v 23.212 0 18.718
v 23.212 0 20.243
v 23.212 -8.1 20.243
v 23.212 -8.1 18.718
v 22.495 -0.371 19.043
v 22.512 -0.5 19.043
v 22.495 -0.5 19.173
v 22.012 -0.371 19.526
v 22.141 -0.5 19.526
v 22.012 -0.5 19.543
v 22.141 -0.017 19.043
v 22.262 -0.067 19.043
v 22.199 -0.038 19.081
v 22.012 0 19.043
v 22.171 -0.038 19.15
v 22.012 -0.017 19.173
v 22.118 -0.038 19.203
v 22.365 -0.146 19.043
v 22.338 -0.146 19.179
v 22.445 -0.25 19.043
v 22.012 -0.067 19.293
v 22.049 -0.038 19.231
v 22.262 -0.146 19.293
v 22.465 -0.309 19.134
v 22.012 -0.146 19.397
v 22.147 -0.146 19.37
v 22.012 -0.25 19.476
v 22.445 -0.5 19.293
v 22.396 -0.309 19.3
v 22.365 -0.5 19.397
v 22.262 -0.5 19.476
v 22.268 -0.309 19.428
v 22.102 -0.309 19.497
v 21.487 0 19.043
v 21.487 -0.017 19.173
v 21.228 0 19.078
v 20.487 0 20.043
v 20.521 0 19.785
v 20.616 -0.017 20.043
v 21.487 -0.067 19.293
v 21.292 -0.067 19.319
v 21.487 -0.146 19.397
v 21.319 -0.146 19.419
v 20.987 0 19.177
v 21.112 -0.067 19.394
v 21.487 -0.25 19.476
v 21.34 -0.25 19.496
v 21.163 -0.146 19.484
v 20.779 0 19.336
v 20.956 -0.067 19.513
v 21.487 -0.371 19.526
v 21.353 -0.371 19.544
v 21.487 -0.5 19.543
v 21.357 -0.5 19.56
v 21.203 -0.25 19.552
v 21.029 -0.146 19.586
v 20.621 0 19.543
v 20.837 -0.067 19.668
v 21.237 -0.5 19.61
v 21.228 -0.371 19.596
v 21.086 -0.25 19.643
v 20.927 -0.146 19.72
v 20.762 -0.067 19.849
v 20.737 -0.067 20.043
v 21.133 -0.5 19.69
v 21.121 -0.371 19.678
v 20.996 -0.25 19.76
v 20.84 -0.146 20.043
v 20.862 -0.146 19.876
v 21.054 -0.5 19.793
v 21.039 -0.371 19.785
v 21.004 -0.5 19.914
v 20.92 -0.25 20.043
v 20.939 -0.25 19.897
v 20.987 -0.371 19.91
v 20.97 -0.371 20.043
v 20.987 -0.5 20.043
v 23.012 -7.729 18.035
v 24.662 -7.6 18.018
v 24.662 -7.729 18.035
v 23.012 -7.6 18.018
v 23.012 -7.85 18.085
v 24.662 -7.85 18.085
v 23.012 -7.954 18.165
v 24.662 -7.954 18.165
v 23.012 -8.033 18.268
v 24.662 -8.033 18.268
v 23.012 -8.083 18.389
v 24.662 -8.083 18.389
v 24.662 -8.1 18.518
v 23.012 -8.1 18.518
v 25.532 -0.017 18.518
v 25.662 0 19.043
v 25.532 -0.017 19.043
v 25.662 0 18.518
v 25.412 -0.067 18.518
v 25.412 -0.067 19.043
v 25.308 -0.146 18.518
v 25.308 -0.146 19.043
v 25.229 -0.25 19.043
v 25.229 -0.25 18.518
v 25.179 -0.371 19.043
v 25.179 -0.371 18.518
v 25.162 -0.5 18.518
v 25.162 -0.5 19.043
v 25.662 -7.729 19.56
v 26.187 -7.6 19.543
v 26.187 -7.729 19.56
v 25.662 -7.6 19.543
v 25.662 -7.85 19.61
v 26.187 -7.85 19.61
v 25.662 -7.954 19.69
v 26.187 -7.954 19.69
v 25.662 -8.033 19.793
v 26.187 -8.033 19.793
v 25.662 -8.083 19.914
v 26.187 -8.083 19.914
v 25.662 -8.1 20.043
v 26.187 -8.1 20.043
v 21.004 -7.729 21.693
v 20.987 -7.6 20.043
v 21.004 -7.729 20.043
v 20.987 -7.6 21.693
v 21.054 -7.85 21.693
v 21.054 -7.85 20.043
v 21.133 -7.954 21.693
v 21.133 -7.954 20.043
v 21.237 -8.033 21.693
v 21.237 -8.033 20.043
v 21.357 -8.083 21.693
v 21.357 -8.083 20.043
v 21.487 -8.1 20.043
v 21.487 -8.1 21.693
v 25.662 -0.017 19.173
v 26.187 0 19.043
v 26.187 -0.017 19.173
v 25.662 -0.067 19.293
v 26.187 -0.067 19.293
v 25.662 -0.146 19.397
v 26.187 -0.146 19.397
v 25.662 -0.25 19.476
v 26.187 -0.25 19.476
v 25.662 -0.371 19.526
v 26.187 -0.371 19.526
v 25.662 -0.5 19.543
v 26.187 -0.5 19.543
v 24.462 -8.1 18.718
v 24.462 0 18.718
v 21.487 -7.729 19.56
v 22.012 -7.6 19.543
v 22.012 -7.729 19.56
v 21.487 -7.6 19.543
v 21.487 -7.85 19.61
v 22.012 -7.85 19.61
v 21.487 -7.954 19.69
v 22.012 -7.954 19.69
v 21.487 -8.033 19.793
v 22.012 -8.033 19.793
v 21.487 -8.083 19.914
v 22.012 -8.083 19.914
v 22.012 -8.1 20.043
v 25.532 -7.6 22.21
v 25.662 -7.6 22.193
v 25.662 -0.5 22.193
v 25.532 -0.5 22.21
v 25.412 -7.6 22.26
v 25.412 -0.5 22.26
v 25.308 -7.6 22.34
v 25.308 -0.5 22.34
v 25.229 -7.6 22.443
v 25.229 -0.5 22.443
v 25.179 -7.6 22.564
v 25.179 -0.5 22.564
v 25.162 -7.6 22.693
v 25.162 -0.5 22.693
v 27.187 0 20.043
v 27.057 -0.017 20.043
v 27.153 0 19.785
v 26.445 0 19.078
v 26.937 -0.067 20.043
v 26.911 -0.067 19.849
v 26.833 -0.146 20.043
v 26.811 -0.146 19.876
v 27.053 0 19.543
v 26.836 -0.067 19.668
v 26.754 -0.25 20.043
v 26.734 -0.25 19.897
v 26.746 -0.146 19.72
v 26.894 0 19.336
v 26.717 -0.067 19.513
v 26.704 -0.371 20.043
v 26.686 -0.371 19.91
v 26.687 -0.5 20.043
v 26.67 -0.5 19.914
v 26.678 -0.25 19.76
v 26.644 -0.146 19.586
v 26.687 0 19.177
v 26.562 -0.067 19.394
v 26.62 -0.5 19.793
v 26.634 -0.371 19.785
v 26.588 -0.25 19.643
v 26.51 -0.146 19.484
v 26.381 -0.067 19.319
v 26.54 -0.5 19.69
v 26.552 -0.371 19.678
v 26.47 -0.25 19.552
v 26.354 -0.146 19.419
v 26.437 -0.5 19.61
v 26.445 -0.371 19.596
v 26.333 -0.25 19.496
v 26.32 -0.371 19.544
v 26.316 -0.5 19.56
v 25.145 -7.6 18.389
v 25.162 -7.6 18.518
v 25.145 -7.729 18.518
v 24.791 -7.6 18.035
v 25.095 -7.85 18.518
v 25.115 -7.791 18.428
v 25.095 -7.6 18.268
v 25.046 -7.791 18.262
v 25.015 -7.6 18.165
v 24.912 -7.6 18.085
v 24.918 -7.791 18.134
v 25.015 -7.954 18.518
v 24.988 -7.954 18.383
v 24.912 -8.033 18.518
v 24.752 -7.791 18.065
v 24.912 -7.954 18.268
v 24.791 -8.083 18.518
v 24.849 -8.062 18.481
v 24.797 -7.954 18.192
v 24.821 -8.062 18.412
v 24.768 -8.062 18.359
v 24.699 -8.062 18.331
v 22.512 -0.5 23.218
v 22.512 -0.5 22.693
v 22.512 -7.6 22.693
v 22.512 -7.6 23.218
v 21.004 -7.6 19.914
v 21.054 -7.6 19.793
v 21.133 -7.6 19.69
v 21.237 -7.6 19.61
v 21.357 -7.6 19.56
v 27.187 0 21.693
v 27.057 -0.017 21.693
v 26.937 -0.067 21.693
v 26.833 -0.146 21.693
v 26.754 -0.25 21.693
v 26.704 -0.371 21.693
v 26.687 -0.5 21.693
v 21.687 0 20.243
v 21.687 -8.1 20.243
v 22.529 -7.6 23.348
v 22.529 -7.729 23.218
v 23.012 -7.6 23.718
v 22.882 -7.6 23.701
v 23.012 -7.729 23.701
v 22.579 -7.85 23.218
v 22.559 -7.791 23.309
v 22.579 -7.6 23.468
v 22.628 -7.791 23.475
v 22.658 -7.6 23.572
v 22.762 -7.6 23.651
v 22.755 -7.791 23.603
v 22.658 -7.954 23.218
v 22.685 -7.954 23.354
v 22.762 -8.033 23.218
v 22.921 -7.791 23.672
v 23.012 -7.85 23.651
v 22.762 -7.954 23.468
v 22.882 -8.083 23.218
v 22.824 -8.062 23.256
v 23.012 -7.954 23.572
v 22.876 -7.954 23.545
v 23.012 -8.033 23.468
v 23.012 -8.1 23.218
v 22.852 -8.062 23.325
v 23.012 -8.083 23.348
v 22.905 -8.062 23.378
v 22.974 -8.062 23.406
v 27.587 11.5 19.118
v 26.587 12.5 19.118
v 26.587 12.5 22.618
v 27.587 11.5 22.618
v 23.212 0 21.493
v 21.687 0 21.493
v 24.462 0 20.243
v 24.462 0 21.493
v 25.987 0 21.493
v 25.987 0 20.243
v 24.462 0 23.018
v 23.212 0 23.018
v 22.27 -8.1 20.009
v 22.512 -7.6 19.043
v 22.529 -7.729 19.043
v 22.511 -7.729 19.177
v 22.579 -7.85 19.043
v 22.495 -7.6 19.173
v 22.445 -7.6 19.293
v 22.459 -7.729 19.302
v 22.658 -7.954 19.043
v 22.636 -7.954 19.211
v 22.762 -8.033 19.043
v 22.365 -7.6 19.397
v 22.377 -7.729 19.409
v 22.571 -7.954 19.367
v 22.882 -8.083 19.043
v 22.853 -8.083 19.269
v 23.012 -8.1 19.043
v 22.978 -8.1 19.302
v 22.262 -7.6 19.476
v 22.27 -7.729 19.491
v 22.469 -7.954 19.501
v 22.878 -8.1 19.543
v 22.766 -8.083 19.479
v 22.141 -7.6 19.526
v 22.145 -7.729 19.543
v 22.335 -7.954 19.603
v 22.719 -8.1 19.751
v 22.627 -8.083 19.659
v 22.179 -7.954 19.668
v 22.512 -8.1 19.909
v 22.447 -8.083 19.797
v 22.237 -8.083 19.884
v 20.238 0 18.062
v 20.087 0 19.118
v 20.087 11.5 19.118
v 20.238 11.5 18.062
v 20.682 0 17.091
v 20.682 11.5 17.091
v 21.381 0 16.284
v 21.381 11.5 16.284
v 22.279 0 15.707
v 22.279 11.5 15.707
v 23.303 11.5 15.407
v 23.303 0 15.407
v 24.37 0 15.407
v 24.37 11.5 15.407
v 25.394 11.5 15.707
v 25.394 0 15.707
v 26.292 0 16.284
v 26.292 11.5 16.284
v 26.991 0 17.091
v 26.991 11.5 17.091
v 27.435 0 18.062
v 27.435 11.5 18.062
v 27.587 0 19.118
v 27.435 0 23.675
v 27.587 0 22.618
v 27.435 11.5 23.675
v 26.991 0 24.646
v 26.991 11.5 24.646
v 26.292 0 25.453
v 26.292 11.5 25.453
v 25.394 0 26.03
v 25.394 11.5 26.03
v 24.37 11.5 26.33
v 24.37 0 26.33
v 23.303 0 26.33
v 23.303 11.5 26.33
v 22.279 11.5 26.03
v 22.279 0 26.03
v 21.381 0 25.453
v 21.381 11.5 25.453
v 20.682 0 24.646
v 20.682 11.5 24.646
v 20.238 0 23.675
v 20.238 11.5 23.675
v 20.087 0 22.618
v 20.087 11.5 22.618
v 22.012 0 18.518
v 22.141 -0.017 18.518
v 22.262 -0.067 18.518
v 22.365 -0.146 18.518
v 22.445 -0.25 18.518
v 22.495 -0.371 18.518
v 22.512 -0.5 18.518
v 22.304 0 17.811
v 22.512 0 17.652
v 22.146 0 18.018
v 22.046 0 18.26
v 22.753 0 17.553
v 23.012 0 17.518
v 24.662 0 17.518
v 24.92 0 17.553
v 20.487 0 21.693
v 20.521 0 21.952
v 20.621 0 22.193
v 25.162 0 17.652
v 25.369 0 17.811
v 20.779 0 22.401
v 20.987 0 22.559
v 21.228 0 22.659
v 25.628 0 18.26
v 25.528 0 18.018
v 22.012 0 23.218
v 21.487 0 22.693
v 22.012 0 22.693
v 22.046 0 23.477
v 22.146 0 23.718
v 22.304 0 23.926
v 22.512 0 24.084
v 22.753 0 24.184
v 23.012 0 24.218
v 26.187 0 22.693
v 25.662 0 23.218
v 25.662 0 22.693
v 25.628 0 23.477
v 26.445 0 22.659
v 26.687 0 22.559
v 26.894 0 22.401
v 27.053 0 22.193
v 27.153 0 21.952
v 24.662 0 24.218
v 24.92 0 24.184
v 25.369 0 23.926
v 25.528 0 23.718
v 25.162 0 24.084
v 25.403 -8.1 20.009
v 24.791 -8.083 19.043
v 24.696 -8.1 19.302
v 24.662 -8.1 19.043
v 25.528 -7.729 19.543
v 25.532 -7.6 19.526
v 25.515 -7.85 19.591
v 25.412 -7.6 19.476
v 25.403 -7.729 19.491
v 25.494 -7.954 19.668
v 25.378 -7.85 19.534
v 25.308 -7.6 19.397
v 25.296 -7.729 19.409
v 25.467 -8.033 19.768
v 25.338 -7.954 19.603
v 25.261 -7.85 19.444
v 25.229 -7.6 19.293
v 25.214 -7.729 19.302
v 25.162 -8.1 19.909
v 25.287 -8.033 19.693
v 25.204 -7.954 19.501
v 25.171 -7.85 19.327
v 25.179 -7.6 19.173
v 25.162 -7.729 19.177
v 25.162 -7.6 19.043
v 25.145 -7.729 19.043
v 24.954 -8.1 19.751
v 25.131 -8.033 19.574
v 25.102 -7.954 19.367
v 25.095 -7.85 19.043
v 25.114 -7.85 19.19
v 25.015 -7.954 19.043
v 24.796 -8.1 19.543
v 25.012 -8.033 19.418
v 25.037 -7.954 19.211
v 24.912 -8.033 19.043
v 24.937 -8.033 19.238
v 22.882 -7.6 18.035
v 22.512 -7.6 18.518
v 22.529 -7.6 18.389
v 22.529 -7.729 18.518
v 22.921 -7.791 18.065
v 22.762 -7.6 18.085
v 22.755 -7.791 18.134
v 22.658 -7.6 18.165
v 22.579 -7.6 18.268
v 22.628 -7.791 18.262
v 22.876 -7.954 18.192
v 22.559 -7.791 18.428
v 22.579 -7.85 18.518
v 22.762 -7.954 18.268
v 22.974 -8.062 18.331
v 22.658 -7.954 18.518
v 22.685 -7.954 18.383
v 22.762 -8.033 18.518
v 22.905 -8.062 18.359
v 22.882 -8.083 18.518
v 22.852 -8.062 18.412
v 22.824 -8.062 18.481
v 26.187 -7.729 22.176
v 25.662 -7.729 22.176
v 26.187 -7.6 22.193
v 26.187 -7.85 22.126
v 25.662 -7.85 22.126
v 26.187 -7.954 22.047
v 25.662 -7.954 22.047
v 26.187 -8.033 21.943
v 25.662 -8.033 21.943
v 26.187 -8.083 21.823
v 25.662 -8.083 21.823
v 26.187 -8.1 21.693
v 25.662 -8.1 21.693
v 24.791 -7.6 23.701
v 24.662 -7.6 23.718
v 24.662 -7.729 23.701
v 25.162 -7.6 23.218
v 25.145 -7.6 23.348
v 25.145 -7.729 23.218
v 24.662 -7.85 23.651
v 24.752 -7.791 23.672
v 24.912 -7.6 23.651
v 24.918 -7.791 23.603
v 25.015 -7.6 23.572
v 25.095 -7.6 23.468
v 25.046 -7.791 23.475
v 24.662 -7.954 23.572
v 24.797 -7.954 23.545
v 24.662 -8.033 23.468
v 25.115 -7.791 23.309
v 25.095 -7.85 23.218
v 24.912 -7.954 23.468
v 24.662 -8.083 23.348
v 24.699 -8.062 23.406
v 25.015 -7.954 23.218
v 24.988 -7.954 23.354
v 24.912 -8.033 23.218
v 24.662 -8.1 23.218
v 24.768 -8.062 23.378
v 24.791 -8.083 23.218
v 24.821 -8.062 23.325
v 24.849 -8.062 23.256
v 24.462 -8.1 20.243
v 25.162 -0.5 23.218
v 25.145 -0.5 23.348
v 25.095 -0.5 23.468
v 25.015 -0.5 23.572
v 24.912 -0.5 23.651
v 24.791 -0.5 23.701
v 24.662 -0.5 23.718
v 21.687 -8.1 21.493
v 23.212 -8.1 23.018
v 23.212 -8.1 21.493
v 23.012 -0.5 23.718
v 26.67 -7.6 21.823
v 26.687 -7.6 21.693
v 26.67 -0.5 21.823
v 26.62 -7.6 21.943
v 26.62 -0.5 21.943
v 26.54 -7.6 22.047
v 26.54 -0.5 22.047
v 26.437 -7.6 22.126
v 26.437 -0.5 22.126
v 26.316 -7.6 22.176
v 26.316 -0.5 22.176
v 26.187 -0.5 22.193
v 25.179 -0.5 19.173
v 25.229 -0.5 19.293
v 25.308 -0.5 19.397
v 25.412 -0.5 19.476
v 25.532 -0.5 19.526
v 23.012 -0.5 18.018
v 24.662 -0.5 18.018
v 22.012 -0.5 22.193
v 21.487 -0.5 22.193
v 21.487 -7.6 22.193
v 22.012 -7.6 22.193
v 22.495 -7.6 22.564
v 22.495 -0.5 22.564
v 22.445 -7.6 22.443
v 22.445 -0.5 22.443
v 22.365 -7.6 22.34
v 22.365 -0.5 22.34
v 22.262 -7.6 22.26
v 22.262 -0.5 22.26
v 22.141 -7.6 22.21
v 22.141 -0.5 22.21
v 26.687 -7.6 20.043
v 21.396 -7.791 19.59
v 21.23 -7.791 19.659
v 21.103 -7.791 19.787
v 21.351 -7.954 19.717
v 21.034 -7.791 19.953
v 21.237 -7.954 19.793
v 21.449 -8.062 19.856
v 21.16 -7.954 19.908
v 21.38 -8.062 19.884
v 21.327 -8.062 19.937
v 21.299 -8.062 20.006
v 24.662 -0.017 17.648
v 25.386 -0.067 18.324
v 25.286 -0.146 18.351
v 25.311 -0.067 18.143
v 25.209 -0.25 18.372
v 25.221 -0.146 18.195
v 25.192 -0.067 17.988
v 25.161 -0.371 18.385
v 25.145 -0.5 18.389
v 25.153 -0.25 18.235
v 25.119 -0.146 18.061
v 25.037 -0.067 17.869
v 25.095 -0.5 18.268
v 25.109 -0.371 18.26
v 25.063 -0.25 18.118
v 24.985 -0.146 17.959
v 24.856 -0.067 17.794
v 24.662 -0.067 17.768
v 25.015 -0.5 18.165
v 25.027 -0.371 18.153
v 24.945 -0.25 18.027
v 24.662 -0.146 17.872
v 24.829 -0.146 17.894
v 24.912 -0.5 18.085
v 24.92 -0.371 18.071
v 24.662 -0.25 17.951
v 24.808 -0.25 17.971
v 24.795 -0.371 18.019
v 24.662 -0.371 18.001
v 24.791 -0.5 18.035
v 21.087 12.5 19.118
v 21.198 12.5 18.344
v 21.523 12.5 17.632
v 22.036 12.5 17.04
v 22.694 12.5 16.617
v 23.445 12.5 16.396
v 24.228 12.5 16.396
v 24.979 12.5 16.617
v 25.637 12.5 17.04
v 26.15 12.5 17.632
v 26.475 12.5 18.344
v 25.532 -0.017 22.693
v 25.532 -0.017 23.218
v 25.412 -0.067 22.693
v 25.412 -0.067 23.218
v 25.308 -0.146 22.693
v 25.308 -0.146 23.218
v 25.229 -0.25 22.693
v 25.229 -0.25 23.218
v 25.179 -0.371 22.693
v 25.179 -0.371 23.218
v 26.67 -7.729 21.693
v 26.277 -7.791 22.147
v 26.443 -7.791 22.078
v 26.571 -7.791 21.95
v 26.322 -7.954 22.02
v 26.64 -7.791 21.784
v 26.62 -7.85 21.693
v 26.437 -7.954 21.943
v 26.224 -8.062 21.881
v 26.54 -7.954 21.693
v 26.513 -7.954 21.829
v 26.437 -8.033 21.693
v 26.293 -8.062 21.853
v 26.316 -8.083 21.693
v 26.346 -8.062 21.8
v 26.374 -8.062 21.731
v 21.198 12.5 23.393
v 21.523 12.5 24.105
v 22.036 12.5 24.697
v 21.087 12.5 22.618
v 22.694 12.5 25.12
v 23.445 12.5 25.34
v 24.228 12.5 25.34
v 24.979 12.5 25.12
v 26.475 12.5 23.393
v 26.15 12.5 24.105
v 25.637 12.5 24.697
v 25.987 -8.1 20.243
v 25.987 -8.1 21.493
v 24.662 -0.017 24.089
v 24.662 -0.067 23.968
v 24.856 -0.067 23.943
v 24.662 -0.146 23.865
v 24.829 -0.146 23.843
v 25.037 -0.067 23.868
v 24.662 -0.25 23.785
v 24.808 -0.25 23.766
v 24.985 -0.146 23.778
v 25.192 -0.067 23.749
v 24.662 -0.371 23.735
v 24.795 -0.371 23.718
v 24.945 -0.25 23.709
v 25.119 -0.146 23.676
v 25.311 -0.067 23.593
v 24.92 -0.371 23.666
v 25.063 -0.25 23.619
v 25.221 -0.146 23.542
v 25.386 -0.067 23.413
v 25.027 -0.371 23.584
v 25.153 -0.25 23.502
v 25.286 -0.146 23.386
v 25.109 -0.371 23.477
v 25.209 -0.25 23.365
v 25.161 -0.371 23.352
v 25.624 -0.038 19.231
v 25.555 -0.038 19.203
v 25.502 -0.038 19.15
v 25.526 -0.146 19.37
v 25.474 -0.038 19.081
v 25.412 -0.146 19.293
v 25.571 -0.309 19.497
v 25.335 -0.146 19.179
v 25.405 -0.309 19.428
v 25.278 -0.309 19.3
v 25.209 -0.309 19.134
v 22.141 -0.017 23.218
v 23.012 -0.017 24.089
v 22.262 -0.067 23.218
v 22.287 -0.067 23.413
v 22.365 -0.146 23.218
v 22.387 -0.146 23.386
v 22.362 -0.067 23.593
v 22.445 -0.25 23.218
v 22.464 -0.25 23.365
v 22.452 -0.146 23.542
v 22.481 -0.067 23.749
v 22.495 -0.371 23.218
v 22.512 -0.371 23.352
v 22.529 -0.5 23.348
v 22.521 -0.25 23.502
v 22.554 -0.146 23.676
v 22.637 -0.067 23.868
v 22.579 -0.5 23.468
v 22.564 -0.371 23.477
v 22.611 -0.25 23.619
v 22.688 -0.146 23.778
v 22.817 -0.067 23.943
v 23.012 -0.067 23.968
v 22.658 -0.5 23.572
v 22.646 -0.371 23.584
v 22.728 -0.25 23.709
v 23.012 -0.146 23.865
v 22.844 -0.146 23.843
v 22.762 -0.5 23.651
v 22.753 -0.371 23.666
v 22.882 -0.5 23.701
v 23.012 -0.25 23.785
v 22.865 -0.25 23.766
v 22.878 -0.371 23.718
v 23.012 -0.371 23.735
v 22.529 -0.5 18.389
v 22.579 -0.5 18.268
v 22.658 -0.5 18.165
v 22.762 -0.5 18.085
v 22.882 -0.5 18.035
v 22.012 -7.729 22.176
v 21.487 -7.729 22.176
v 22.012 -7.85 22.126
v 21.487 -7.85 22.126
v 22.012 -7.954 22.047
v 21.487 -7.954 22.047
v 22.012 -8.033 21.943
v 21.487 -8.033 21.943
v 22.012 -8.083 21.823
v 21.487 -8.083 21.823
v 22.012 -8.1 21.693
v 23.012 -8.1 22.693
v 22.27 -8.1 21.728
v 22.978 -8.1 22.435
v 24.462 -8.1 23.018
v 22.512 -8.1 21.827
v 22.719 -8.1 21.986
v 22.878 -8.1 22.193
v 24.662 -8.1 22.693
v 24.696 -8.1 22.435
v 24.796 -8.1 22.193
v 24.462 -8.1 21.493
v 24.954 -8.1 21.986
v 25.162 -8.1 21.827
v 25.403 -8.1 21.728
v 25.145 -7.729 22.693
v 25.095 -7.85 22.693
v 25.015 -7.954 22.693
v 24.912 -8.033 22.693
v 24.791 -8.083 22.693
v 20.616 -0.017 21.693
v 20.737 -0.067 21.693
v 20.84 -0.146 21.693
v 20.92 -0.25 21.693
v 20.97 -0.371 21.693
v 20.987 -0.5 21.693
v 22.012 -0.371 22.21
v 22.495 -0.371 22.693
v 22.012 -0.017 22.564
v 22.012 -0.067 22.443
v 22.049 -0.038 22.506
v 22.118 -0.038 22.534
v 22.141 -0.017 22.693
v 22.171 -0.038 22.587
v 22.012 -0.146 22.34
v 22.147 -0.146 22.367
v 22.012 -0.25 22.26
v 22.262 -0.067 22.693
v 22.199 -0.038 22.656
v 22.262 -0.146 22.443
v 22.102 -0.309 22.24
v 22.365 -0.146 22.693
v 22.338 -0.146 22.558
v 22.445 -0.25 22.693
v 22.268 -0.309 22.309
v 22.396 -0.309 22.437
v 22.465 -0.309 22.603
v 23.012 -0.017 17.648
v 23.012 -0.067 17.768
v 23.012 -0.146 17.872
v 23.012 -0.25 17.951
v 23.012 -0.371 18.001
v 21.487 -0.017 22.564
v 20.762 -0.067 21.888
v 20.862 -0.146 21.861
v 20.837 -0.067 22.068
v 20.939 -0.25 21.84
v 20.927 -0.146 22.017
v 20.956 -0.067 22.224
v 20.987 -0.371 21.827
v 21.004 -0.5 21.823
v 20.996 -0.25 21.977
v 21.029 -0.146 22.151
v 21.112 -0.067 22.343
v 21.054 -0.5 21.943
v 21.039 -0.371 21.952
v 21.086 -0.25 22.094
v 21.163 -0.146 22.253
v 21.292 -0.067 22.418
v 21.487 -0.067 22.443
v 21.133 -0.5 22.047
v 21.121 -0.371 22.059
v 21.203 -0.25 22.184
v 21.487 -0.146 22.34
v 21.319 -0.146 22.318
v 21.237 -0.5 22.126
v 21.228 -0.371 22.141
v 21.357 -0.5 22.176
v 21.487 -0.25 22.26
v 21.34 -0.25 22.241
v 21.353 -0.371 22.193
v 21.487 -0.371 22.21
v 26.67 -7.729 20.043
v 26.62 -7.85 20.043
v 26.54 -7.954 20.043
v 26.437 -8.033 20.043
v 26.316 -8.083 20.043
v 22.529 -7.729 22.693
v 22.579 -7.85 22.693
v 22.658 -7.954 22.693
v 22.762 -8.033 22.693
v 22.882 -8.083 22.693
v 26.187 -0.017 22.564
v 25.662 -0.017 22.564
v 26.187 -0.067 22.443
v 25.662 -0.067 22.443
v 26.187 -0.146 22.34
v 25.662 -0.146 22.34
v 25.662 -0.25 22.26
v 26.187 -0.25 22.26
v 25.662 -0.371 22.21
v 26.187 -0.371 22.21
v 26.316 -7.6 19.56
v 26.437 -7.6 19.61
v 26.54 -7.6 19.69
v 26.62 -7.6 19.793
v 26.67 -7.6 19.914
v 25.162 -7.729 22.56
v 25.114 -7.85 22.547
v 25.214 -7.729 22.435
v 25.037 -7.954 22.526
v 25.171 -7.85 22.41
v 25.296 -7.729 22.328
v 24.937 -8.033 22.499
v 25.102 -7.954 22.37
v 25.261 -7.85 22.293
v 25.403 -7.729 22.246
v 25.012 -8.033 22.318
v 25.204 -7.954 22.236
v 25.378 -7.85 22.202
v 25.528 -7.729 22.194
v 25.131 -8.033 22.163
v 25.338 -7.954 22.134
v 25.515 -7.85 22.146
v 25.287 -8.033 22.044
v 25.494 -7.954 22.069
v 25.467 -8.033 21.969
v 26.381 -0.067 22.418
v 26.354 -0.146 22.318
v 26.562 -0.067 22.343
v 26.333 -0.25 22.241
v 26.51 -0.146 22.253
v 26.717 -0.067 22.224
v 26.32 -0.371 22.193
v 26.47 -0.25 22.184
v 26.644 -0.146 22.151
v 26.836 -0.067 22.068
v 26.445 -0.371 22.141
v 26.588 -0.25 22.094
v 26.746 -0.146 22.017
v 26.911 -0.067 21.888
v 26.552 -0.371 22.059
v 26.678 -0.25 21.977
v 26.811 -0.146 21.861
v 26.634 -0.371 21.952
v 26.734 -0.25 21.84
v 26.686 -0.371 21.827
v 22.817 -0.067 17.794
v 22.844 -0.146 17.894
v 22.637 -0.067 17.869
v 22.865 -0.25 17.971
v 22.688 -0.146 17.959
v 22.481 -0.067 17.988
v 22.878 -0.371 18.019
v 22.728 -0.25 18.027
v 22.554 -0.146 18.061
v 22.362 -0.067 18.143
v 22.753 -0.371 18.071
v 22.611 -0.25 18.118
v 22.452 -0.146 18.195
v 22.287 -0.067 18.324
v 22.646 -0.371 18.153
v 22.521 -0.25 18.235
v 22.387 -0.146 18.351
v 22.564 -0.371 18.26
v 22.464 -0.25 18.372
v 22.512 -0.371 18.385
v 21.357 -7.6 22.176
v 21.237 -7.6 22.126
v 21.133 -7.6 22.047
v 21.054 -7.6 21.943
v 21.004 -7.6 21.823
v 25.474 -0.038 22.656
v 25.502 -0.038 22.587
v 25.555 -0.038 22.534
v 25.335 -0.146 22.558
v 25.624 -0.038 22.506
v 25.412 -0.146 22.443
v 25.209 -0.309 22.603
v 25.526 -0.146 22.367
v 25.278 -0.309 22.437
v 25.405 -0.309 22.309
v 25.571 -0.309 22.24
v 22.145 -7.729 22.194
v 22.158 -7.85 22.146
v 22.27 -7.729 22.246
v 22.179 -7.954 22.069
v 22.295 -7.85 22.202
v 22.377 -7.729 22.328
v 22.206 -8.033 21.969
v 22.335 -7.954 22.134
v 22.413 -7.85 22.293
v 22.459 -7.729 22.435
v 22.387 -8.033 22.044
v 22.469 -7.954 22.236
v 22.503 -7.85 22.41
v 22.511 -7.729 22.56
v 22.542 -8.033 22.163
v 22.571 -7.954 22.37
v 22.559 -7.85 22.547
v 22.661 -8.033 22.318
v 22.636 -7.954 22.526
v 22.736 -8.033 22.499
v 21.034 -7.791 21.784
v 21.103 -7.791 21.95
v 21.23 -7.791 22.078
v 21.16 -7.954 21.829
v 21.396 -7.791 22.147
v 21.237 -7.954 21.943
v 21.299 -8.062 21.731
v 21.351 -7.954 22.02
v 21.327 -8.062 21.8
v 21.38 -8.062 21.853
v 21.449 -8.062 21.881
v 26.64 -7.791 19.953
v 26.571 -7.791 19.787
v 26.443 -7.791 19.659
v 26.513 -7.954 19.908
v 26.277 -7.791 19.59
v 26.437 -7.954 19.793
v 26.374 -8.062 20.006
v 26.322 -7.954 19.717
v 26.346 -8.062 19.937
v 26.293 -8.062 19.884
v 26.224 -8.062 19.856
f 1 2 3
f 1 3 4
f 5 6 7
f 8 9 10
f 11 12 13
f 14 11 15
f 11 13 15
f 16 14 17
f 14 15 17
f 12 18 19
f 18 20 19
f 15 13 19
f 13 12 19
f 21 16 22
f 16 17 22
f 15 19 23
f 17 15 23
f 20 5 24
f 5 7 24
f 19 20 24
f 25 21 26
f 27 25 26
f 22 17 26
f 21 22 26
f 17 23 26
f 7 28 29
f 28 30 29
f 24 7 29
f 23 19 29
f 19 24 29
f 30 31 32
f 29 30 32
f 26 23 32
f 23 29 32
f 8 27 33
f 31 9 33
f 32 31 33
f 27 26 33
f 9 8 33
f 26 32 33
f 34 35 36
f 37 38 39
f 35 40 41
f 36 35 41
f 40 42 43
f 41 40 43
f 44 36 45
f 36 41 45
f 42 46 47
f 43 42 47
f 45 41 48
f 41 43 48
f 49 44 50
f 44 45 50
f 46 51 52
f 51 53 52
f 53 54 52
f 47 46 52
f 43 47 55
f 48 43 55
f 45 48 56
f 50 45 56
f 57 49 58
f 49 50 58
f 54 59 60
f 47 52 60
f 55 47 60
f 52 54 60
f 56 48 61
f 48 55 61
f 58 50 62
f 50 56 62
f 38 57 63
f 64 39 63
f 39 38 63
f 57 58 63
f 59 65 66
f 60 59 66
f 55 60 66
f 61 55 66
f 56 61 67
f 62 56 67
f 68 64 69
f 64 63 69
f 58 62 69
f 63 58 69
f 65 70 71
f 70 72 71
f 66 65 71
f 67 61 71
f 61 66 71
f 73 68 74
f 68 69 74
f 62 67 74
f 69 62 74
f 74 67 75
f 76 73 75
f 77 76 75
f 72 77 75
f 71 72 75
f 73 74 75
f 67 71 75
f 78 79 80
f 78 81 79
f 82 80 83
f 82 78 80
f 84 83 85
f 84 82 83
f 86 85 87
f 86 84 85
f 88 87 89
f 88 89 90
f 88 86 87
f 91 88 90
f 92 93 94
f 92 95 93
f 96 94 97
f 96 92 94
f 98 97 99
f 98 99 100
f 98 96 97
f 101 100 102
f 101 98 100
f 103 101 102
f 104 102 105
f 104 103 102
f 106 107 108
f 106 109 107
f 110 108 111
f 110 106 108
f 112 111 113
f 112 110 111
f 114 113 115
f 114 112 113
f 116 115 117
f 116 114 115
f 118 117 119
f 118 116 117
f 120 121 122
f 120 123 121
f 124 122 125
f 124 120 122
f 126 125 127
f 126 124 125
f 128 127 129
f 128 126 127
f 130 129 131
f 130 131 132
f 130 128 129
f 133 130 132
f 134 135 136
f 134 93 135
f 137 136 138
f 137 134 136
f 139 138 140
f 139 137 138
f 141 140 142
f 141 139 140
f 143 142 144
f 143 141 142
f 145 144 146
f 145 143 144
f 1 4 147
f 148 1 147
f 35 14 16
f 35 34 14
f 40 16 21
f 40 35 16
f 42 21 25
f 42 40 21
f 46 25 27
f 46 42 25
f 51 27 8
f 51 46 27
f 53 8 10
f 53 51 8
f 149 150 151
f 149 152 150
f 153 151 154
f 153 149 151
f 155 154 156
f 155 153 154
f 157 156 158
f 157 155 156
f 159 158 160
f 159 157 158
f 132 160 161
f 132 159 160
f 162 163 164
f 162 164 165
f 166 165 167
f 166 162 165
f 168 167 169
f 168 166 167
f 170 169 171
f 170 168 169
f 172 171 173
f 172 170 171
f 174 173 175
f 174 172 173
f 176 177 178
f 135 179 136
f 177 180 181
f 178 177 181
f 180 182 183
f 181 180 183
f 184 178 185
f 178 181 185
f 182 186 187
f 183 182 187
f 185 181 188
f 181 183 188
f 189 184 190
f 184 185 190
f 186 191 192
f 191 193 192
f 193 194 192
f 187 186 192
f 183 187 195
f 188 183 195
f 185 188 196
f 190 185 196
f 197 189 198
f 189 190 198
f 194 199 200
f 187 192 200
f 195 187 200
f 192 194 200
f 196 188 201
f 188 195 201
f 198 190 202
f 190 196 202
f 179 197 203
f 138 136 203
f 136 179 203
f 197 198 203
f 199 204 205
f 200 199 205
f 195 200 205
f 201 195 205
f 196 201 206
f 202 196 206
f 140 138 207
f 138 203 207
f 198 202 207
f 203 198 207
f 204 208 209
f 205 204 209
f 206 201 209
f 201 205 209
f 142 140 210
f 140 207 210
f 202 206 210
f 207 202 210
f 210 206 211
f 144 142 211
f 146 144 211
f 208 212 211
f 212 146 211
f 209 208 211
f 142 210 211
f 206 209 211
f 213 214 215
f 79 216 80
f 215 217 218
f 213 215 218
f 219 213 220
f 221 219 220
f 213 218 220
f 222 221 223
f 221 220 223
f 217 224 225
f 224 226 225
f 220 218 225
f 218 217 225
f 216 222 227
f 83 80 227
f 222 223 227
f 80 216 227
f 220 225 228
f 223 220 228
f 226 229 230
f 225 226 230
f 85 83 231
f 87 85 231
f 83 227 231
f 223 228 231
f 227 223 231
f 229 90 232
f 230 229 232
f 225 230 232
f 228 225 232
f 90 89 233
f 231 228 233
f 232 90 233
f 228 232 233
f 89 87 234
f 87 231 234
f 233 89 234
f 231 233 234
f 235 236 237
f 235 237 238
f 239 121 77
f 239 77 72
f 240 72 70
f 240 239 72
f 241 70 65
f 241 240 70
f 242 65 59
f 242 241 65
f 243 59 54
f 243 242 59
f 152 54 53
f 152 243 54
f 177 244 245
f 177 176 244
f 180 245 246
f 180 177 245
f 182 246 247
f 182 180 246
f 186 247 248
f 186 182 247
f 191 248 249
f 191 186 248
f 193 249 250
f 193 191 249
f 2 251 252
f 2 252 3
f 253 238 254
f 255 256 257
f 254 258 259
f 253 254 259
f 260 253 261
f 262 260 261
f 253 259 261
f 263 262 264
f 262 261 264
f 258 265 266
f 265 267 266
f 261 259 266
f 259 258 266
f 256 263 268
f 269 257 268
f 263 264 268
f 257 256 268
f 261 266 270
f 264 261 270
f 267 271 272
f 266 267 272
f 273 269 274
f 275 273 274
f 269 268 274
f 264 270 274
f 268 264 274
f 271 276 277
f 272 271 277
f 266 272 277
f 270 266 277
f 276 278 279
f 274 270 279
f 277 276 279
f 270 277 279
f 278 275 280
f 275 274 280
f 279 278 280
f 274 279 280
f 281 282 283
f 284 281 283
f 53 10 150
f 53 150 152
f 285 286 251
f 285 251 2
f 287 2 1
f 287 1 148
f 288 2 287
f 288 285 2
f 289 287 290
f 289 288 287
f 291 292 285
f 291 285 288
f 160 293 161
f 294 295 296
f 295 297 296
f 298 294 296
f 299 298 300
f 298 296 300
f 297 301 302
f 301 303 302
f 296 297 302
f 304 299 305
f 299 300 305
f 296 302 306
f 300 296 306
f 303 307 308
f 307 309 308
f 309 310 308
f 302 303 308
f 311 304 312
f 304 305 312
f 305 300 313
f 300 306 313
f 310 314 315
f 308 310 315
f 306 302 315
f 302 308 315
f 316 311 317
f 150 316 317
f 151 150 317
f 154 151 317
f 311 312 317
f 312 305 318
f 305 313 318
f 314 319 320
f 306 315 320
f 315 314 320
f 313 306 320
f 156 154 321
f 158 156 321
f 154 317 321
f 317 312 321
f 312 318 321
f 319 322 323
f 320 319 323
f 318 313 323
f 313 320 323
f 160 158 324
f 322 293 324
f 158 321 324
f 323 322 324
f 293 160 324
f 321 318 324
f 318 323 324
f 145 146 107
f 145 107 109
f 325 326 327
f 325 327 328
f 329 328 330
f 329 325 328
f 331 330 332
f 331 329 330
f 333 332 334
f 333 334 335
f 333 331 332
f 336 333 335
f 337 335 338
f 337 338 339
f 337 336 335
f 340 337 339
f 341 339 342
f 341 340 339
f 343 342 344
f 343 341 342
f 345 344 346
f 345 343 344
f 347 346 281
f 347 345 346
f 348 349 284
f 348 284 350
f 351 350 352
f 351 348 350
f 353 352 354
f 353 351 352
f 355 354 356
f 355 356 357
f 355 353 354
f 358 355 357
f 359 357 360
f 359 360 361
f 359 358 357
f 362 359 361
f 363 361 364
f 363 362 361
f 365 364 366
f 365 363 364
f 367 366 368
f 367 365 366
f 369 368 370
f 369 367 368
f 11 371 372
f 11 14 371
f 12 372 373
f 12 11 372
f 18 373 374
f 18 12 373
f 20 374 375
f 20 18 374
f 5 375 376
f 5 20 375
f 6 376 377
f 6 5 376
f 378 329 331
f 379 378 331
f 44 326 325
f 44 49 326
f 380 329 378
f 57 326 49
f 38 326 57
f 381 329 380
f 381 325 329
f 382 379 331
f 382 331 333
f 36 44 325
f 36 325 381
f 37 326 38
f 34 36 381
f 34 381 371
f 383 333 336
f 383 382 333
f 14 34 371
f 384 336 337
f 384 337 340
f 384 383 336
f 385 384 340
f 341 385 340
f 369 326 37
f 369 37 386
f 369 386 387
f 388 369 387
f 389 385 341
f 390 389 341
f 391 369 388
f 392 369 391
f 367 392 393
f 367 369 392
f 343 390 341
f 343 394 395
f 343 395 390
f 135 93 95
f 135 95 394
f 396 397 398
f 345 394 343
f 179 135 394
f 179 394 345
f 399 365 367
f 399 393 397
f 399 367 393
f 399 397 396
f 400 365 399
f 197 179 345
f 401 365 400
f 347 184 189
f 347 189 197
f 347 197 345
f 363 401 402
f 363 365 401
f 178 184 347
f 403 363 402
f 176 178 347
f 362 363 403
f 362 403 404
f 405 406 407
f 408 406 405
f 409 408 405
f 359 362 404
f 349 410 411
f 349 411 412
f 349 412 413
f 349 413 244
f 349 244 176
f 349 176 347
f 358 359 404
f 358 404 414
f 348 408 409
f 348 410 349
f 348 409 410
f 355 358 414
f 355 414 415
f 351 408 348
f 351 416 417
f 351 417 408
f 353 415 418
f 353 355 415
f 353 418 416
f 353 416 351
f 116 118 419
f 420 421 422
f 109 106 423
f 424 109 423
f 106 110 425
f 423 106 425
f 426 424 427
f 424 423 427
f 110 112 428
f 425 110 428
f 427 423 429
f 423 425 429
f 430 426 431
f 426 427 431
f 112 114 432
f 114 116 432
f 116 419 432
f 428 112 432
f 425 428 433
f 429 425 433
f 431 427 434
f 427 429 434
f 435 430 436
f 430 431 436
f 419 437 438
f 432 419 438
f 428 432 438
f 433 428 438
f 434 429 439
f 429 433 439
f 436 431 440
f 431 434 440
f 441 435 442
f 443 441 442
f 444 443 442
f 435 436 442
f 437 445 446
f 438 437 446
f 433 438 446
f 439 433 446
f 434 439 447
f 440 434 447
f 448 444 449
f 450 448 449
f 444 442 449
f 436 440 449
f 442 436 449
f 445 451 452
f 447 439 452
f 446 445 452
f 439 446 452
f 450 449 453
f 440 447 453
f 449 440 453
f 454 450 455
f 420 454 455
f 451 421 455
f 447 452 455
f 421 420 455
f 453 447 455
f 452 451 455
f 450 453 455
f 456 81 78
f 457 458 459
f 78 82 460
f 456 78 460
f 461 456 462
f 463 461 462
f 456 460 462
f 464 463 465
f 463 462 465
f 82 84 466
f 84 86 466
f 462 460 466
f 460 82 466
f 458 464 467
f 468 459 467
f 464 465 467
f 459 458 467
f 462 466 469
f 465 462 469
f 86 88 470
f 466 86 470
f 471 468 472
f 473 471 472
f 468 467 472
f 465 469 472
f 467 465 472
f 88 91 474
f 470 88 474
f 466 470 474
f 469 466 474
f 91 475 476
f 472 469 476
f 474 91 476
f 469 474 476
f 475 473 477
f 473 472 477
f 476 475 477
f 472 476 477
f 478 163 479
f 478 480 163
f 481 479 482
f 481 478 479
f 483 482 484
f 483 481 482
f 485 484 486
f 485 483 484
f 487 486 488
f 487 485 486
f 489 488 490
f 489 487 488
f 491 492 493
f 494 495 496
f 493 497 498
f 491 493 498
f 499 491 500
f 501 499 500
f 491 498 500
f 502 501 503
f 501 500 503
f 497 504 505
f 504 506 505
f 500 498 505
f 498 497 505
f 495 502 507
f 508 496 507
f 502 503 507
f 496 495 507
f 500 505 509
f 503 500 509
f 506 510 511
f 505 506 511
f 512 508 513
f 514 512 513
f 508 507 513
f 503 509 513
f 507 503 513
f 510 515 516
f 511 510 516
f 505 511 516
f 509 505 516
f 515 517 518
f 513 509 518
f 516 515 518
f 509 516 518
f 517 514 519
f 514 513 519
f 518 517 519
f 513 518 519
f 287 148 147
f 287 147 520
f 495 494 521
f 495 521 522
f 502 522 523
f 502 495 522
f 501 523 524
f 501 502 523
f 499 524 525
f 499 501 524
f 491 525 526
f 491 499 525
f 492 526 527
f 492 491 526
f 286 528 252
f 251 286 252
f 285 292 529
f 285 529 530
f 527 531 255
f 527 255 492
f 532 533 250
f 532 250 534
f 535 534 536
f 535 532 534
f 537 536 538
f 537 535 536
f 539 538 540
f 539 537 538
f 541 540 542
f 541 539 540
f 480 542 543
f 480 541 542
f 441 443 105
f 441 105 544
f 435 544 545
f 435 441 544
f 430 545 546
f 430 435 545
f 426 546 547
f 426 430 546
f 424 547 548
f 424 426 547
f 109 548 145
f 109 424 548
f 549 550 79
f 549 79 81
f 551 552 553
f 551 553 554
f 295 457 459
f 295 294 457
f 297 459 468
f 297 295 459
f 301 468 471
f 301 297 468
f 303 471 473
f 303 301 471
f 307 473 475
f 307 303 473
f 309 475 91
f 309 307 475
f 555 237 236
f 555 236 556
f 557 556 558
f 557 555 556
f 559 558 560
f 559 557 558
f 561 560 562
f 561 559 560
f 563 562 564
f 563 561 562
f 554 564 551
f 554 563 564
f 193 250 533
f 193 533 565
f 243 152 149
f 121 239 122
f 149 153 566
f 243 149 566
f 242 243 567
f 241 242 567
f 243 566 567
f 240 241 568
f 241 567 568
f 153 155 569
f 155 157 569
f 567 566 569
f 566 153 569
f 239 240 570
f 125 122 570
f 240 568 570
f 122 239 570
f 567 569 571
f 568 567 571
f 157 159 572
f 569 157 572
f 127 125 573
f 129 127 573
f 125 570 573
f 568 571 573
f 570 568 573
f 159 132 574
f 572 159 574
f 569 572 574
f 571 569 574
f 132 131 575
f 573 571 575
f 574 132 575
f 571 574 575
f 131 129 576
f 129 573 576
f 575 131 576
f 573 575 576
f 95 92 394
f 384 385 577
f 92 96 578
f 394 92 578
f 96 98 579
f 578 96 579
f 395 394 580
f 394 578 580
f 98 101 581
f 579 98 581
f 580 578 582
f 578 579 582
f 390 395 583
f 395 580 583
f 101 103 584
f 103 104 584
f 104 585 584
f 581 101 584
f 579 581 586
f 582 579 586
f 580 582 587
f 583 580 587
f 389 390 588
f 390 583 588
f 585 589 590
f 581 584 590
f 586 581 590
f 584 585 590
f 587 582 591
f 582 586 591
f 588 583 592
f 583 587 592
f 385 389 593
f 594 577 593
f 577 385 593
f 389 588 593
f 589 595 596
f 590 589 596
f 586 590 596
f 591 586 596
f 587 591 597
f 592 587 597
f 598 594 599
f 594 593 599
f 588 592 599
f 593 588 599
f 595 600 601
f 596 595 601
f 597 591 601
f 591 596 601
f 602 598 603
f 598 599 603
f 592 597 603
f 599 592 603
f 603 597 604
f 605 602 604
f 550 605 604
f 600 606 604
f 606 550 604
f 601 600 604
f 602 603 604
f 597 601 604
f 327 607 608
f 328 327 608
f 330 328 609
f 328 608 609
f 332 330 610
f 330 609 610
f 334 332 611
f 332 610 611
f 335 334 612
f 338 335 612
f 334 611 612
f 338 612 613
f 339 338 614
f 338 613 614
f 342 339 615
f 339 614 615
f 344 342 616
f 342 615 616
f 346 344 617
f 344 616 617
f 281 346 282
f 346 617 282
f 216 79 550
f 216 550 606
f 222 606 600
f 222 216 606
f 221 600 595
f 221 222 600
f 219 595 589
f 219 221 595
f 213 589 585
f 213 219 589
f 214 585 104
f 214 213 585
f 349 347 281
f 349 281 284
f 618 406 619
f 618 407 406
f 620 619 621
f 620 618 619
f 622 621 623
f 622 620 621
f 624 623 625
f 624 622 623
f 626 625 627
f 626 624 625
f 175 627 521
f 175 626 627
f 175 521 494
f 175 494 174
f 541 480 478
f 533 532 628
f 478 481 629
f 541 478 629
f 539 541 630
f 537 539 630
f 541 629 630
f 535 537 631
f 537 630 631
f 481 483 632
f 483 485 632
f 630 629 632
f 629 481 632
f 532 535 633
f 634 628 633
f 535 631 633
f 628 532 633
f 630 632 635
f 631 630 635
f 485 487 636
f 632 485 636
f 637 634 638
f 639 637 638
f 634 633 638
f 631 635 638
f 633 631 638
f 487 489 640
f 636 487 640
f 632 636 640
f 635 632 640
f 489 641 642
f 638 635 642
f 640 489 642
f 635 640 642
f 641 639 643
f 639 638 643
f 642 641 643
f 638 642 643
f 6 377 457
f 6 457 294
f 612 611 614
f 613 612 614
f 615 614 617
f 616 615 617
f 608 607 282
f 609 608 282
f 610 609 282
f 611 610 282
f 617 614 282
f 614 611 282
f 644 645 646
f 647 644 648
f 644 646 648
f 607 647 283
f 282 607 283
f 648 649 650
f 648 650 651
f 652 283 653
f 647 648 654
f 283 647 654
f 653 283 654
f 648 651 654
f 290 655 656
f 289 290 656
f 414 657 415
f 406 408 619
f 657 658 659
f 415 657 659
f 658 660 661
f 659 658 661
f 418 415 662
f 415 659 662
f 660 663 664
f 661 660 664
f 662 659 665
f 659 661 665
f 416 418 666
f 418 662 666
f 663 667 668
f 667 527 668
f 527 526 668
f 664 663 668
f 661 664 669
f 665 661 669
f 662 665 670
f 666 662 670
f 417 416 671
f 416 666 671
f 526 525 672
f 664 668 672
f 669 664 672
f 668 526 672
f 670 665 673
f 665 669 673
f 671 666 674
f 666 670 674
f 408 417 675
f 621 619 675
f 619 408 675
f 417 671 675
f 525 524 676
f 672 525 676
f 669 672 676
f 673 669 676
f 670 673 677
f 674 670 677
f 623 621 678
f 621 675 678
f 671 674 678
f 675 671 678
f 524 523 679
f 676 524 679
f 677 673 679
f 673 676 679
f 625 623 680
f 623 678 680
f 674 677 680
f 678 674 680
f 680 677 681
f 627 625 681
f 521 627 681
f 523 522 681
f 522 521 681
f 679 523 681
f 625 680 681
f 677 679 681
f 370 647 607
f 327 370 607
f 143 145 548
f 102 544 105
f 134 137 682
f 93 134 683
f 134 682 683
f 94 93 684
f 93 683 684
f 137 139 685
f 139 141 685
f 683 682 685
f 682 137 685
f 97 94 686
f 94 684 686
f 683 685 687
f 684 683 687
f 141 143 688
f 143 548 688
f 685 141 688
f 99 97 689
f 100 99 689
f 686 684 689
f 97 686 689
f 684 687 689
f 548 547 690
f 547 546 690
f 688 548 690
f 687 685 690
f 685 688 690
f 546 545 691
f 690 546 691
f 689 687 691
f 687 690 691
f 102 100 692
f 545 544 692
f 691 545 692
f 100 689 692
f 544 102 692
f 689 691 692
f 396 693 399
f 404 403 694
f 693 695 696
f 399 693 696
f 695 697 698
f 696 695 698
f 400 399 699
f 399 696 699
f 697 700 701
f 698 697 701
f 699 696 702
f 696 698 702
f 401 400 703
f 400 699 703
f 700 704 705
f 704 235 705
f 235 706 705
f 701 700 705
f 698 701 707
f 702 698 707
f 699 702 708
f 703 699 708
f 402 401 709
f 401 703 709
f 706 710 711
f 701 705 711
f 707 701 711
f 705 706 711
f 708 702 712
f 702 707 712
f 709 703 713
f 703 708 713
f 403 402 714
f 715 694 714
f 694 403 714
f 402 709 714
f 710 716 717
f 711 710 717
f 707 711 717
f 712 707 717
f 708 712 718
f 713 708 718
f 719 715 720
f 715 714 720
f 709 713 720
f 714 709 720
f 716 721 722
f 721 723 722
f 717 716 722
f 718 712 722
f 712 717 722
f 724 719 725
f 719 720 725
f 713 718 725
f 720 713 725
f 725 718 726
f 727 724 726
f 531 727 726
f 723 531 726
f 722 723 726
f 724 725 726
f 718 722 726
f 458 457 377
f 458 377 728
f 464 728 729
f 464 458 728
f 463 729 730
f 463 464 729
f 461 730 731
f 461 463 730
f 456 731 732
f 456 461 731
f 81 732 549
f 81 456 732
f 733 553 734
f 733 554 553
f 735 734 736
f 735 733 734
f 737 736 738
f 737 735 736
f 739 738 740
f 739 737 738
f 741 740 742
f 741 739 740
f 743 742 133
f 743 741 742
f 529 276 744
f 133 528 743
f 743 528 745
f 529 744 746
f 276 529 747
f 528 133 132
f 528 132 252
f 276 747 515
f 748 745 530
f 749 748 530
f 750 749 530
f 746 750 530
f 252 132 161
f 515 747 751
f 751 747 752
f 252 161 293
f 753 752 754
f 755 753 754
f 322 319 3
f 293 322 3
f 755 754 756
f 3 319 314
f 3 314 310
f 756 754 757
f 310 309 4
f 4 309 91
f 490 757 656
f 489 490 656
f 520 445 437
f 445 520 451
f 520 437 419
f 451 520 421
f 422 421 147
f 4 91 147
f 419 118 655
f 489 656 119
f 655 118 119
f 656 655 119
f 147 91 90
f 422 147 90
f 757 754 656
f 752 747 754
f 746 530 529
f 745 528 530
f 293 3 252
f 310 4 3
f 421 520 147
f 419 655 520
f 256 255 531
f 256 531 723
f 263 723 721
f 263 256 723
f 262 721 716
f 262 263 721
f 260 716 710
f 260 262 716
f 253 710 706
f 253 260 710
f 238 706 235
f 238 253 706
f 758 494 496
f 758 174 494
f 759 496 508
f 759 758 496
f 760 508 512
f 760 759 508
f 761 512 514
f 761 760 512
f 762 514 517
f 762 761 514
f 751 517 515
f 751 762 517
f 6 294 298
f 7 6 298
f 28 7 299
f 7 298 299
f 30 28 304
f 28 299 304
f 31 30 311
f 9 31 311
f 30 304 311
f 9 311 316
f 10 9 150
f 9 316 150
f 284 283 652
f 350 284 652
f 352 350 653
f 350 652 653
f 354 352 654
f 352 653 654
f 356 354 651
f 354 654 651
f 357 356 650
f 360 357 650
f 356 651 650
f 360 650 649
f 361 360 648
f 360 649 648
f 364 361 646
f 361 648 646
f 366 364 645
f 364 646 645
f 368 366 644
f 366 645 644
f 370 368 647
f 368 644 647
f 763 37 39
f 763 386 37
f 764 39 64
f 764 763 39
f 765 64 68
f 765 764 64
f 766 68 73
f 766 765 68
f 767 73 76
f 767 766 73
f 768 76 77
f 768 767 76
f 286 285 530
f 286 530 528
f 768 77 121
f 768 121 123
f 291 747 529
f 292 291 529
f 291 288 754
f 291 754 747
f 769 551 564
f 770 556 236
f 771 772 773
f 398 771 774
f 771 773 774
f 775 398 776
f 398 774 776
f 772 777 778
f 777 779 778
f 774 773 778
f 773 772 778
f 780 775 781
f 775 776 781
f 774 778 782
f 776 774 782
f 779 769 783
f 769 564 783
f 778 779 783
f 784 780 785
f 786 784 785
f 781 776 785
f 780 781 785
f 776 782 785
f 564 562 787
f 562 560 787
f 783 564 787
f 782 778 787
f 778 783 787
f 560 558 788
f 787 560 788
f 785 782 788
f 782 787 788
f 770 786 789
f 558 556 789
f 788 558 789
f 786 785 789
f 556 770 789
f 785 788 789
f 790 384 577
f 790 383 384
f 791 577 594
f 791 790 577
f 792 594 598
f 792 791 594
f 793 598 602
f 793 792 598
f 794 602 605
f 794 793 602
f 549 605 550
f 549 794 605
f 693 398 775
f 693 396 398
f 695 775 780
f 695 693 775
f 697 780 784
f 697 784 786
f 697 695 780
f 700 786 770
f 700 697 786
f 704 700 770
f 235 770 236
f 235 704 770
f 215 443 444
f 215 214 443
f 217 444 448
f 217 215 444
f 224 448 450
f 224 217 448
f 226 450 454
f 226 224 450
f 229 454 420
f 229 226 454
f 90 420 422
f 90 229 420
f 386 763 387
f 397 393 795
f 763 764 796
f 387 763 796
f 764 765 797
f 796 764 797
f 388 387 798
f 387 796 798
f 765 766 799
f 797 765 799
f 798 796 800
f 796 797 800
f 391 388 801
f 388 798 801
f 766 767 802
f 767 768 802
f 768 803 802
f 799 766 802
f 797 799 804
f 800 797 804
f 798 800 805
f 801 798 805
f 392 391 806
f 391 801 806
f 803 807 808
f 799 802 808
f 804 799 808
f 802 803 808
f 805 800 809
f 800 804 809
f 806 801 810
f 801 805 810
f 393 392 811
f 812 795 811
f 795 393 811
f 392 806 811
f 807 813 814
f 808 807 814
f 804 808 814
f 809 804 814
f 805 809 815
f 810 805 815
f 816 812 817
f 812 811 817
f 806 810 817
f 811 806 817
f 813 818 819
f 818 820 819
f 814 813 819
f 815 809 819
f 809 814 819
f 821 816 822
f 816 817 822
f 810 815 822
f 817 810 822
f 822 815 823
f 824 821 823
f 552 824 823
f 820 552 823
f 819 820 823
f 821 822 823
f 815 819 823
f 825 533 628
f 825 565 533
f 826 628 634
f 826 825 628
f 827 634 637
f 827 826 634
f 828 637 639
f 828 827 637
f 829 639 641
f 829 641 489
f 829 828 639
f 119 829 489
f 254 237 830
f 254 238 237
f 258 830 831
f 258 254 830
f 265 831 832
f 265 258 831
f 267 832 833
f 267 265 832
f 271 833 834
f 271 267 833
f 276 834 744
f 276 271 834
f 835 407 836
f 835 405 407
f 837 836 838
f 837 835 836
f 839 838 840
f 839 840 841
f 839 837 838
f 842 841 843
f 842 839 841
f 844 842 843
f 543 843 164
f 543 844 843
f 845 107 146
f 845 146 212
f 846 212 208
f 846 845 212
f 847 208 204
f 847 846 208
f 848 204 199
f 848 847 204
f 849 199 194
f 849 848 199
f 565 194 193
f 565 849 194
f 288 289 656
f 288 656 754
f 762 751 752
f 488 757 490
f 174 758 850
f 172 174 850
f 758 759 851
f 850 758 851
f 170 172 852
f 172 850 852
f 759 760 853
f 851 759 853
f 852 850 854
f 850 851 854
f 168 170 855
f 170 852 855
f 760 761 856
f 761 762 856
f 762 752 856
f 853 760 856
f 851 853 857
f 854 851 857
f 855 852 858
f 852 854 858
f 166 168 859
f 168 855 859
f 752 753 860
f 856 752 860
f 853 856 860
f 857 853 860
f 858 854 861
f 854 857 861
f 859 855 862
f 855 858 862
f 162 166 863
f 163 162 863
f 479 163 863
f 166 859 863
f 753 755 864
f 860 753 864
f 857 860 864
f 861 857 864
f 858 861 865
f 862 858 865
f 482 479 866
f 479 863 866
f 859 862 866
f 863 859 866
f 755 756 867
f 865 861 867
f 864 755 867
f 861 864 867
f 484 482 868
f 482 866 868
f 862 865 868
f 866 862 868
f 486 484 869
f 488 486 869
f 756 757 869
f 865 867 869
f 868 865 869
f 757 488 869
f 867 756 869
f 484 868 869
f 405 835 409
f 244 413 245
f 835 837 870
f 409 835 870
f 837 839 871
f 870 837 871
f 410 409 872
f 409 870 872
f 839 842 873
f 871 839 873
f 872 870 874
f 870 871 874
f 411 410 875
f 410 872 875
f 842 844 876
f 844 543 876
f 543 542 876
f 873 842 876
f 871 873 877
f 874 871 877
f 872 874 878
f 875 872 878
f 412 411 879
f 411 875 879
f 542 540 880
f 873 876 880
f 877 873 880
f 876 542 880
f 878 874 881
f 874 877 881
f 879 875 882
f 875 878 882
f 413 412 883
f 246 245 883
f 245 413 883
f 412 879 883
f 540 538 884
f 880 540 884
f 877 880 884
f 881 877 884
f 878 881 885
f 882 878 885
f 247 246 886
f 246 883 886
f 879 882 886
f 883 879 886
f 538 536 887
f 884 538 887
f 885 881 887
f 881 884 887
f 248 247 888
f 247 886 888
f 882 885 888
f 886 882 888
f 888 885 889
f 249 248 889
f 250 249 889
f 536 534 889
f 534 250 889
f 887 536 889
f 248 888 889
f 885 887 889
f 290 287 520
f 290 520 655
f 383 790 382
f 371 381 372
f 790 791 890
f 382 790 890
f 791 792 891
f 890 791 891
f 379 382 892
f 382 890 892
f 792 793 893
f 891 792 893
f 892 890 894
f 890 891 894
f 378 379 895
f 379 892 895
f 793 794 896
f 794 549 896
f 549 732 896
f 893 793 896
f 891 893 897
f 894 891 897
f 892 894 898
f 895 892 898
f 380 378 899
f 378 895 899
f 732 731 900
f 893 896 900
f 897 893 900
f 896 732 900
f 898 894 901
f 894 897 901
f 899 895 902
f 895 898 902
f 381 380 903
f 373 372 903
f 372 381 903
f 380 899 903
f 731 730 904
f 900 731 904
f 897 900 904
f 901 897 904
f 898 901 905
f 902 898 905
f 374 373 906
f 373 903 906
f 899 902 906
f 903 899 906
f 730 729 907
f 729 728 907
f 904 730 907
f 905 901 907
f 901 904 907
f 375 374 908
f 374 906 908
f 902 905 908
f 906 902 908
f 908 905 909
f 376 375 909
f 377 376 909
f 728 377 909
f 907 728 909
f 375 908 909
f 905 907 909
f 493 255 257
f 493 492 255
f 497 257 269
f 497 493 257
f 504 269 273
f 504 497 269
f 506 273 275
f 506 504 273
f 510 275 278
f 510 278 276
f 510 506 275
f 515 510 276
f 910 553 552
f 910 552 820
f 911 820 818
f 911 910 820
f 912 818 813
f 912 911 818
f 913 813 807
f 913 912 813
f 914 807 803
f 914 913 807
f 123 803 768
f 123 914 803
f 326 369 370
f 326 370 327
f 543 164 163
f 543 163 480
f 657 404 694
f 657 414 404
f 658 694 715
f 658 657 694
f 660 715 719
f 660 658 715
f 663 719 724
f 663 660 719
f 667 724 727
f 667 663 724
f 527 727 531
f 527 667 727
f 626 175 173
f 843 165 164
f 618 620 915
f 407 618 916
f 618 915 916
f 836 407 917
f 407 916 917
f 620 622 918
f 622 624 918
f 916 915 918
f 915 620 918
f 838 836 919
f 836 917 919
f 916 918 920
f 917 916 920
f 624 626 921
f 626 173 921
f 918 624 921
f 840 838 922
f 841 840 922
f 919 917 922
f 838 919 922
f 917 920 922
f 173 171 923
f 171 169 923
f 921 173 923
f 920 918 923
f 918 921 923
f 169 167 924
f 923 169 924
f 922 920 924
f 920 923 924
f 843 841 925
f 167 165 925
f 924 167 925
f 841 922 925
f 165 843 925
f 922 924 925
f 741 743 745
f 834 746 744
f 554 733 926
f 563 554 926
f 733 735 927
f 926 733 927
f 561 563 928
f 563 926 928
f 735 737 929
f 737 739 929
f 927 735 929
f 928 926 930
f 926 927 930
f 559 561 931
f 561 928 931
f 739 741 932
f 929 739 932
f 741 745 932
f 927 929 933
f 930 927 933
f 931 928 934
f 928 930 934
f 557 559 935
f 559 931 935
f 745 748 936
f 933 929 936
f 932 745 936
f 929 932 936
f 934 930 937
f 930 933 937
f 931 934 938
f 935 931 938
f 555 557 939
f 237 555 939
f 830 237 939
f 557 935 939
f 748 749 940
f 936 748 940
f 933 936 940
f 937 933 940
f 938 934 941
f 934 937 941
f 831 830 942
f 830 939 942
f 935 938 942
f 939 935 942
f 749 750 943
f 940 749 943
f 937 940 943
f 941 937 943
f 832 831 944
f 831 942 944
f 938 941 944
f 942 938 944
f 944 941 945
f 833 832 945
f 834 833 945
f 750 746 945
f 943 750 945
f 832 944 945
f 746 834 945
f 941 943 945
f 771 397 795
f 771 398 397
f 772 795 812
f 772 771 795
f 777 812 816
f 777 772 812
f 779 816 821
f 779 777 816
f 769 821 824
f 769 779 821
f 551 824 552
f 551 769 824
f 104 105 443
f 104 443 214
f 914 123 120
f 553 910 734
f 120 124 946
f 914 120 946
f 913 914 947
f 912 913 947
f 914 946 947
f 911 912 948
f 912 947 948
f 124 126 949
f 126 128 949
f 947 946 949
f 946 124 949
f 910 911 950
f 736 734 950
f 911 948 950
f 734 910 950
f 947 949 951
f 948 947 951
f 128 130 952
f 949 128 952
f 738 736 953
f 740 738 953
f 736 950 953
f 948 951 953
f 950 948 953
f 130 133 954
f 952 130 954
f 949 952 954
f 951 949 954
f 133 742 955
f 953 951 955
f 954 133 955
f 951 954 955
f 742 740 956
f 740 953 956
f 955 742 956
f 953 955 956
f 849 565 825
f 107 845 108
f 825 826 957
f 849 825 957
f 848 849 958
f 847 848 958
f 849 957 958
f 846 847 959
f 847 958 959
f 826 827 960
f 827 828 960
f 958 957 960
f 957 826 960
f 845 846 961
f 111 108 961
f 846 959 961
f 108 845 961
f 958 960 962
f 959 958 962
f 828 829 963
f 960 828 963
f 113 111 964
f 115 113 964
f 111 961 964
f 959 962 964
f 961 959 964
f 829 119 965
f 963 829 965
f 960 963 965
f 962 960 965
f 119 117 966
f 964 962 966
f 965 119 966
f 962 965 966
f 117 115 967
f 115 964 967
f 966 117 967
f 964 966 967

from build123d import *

# Parameters (mm, degrees)
BOSS_EXTRUDE1_DEPTH = 8.1
BOSS_EXTRUDE2_DEPTH = 12.5
FILLET1_R           = 0.5
FILLET2_R           = 0.5
FILLET4_R           = 0.5
CHAMFER2_SIZE       = 1


with BuildPart() as part:
    # Sketch8 → Boss-Extrude1 (new body)
    with BuildSketch(Plane(origin=(-2.232753674, 0, 0.665681661), x_dir=(-1, 0, 0), z_dir=(0, -1, 0))):
        Polygon((-24.744344877, -18.877779499), (-23.219344877, -18.877779499), (-23.219344877, -21.527779499), (-24.744344877, -21.527779499), (-24.744344877, -23.052779499), (-27.394344877, -23.052779499), (-27.394344877, -21.527779499), (-28.919344877, -21.527779499), (-28.919344877, -18.877779499), (-27.394344877, -18.877779499), (-27.394344877, -17.352779499), (-24.744344877, -17.352779499), align=None)
        Polygon((-26.694344877, -20.827779499), (-26.694344877, -22.352779499), (-25.444344877, -22.352779499), (-25.444344877, -20.827779499), (-23.919344877, -20.827779499), (-23.919344877, -19.577779499), (-25.444344877, -19.577779499), (-25.444344877, -18.052779499), (-26.694344877, -18.052779499), (-26.694344877, -19.577779499), (-28.219344877, -19.577779499), (-28.219344877, -20.827779499), align=None, mode=Mode.SUBTRACT)
    extrude(amount=BOSS_EXTRUDE1_DEPTH)

    # Sketch9 → Boss-Extrude2 (add)
    with BuildSketch(Plane(origin=(0, 0, 0), x_dir=(-1, 0, 0), z_dir=(0, 1, 0))):
        with BuildLine():
            Line((-20.086591203, 22.61846116), (-20.086591203, 19.11846116))
            ThreePointArc((-20.086591203, 19.11846116), (-23.836591203, 15.36846116), (-27.586591203, 19.11846116))
            Line((-27.586591203, 19.11846116), (-27.586591203, 22.61846116))
            ThreePointArc((-27.586591203, 22.61846116), (-23.836591203, 26.36846116), (-20.086591203, 22.61846116))
        make_face()
    extrude(amount=BOSS_EXTRUDE2_DEPTH)

    # Fillet1
    fillet1_edges = [part.edges().sort_by_distance(p)[0] for p in [
        (22.511591203, -4.05, 19.54346116),
        (20.986591203, -4.05, 19.54346116),
        (20.986591203, -4.05, 22.19346116),
        (22.511591203, -4.05, 22.19346116),
        (22.511591203, -4.05, 23.71846116),
        (25.161591203, -4.05, 23.71846116),
        (25.161591203, -4.05, 22.19346116),
        (26.686591203, -4.05, 22.19346116),
        (26.686591203, -4.05, 19.54346116),
        (25.161591203, -4.05, 19.54346116),
        (25.161591203, -4.05, 18.01846116),
        (22.511591203, -4.05, 18.01846116),
    ]]
    fillet(fillet1_edges, radius=FILLET1_R)

    # Fillet2
    fillet2_edges = [part.edges().sort_by_distance(p)[0] for p in [
        (21.749091203, 0, 19.54346116),
        (20.986591203, 0, 20.86846116),
        (21.749091203, 0, 22.19346116),
        (22.511591203, 0, 22.95596116),
        (23.836591203, 0, 23.71846116),
        (25.161591203, 0, 22.95596116),
        (25.924091203, 0, 22.19346116),
        (26.686591203, 0, 20.86846116),
        (25.924091203, 0, 19.54346116),
        (25.161591203, 0, 18.78096116),
        (23.836591203, 0, 18.01846116),
        (25.308037813, 0, 19.39701455),
        (25.308037813, 0, 22.339907769),
        (22.365144594, 0, 22.339907769),
        (22.365144594, 0, 19.39701455),
        (21.133037813, 0, 19.689907769),
        (21.133037813, 0, 22.04701455),
        (22.658037813, 0, 23.57201455),
        (25.015144594, 0, 23.57201455),
        (26.540144594, 0, 22.04701455),
        (26.540144594, 0, 19.689907769),
        (22.658037813, 0, 18.164907769),
        (25.015144594, 0, 18.164907769),
        (22.511591203, 0, 18.78096116),
    ]]
    fillet(fillet2_edges, radius=FILLET2_R)

    # Fillet4
    fillet4_edges = [part.edges().sort_by_distance(p)[0] for p in [
        (21.749091203, -8.1, 19.54346116),
        (20.986591203, -8.1, 20.86846116),
        (23.836591203, -8.1, 18.01846116),
        (25.161591203, -8.1, 18.78096116),
        (25.924091203, -8.1, 19.54346116),
        (26.686591203, -8.1, 20.86846116),
        (25.924091203, -8.1, 22.19346116),
        (25.161591203, -8.1, 22.95596116),
        (23.836591203, -8.1, 23.71846116),
        (22.511591203, -8.1, 22.95596116),
        (21.749091203, -8.1, 22.19346116),
        (25.015144594, -8.1, 18.164907769),
        (22.658037813, -8.1, 18.164907769),
        (26.540144594, -8.1, 19.689907769),
        (26.540144594, -8.1, 22.04701455),
        (25.015144594, -8.1, 23.57201455),
        (22.658037813, -8.1, 23.57201455),
        (21.133037813, -8.1, 22.04701455),
        (21.133037813, -8.1, 19.689907769),
        (22.365144594, -8.1, 19.39701455),
        (22.365144594, -8.1, 22.339907769),
        (25.308037813, -8.1, 22.339907769),
        (25.308037813, -8.1, 19.39701455),
        (22.511591203, -8.1, 18.78096116),
    ]]
    fillet(fillet4_edges, radius=FILLET4_R)

    # Chamfer2
    chamfer2_edges = [part.edges().sort_by_distance(p)[0] for p in [
        (23.836591203, 12.5, 26.36846116),
        (27.586591203, 12.5, 20.86846116),
        (23.836591203, 12.5, 15.36846116),
        (20.086591203, 12.5, 20.86846116),
    ]]
    chamfer(chamfer2_edges, length=CHAMFER2_SIZE)


solid = part.part
